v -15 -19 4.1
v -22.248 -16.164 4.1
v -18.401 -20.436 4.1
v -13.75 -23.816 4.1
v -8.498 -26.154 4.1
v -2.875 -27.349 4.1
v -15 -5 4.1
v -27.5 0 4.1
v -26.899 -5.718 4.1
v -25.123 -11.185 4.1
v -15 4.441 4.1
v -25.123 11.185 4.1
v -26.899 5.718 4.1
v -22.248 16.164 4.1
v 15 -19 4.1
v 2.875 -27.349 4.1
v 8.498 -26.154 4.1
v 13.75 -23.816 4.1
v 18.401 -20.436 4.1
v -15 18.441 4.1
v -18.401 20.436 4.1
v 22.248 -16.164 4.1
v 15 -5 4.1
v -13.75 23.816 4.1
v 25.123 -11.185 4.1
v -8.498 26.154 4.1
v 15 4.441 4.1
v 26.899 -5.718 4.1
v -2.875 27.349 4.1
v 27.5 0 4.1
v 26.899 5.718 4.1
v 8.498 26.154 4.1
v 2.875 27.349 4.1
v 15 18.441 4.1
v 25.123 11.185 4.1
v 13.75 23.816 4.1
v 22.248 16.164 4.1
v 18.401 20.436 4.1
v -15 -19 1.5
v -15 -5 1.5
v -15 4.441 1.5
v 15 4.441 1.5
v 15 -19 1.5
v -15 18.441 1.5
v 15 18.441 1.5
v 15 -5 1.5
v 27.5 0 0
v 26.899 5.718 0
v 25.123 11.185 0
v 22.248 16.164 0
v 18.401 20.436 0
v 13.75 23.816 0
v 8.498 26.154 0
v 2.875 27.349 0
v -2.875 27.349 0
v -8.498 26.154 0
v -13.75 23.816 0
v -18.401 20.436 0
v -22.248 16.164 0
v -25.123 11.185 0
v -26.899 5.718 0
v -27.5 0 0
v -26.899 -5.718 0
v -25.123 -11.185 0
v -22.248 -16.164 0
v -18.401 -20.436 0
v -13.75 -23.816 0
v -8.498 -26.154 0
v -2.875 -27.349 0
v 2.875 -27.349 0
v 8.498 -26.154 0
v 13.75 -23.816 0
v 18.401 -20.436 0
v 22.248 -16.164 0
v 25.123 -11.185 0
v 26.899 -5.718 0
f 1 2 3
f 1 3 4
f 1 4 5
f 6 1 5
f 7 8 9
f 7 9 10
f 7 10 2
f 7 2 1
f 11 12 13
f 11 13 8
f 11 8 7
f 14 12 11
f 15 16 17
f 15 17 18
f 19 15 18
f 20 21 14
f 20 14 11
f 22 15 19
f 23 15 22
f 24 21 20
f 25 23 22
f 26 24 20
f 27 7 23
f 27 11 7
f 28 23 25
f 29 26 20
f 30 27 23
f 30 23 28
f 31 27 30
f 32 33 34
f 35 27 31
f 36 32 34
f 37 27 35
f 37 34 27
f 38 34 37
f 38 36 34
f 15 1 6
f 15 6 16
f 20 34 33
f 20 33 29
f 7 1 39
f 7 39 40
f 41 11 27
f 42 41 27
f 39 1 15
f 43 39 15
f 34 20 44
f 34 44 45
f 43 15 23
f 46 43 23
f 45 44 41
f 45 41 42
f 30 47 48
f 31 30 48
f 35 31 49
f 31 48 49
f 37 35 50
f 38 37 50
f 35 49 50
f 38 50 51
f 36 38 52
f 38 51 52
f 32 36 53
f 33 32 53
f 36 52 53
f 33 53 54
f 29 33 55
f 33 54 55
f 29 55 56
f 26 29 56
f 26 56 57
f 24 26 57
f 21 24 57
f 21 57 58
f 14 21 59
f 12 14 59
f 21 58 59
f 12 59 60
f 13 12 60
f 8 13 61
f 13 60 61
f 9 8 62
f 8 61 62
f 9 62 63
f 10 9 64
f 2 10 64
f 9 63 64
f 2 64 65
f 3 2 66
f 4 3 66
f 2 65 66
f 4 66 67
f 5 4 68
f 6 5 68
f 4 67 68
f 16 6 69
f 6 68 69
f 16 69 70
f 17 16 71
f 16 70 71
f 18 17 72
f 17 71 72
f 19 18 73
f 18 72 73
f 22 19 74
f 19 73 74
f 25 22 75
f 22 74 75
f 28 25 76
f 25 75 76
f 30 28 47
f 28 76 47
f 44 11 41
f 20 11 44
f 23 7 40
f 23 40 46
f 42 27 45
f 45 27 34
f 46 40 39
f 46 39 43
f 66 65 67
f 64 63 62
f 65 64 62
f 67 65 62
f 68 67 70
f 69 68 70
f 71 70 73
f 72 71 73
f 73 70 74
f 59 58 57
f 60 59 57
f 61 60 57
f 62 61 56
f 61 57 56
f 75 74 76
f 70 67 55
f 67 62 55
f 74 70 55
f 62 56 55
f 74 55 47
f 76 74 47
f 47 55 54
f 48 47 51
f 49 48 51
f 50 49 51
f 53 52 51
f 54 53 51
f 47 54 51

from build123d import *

# Parameters (mm, degrees)
F0_R     = 27.5
F1_DEPTH = 4.1
F2_W     = 30
F2_H     = 14
F3_DEPTH = 2.6
F4_W     = 30
F4_H     = 14
F5_DEPTH = 2.6


with BuildPart() as f1:
    # F0 (on Top) → F1 (new body)
    with BuildSketch(Plane.XY):
        Circle(F0_R)
    extrude(amount=F1_DEPTH)

    # F2 (on face) → F3 (cut)
    with BuildSketch(Plane.XY.offset(4.1)):
        with Locations((0, 11.4413)):
            Rectangle(F2_W, F2_H)
    extrude(amount=-F3_DEPTH, mode=Mode.SUBTRACT)

    # F4 (on face) → F5 (cut)
    with BuildSketch(Plane.XY.offset(4.1)):
        with Locations((0, -12)):
            Rectangle(F4_W, F4_H)
    extrude(amount=-F5_DEPTH, mode=Mode.SUBTRACT)


solid = f1.part
